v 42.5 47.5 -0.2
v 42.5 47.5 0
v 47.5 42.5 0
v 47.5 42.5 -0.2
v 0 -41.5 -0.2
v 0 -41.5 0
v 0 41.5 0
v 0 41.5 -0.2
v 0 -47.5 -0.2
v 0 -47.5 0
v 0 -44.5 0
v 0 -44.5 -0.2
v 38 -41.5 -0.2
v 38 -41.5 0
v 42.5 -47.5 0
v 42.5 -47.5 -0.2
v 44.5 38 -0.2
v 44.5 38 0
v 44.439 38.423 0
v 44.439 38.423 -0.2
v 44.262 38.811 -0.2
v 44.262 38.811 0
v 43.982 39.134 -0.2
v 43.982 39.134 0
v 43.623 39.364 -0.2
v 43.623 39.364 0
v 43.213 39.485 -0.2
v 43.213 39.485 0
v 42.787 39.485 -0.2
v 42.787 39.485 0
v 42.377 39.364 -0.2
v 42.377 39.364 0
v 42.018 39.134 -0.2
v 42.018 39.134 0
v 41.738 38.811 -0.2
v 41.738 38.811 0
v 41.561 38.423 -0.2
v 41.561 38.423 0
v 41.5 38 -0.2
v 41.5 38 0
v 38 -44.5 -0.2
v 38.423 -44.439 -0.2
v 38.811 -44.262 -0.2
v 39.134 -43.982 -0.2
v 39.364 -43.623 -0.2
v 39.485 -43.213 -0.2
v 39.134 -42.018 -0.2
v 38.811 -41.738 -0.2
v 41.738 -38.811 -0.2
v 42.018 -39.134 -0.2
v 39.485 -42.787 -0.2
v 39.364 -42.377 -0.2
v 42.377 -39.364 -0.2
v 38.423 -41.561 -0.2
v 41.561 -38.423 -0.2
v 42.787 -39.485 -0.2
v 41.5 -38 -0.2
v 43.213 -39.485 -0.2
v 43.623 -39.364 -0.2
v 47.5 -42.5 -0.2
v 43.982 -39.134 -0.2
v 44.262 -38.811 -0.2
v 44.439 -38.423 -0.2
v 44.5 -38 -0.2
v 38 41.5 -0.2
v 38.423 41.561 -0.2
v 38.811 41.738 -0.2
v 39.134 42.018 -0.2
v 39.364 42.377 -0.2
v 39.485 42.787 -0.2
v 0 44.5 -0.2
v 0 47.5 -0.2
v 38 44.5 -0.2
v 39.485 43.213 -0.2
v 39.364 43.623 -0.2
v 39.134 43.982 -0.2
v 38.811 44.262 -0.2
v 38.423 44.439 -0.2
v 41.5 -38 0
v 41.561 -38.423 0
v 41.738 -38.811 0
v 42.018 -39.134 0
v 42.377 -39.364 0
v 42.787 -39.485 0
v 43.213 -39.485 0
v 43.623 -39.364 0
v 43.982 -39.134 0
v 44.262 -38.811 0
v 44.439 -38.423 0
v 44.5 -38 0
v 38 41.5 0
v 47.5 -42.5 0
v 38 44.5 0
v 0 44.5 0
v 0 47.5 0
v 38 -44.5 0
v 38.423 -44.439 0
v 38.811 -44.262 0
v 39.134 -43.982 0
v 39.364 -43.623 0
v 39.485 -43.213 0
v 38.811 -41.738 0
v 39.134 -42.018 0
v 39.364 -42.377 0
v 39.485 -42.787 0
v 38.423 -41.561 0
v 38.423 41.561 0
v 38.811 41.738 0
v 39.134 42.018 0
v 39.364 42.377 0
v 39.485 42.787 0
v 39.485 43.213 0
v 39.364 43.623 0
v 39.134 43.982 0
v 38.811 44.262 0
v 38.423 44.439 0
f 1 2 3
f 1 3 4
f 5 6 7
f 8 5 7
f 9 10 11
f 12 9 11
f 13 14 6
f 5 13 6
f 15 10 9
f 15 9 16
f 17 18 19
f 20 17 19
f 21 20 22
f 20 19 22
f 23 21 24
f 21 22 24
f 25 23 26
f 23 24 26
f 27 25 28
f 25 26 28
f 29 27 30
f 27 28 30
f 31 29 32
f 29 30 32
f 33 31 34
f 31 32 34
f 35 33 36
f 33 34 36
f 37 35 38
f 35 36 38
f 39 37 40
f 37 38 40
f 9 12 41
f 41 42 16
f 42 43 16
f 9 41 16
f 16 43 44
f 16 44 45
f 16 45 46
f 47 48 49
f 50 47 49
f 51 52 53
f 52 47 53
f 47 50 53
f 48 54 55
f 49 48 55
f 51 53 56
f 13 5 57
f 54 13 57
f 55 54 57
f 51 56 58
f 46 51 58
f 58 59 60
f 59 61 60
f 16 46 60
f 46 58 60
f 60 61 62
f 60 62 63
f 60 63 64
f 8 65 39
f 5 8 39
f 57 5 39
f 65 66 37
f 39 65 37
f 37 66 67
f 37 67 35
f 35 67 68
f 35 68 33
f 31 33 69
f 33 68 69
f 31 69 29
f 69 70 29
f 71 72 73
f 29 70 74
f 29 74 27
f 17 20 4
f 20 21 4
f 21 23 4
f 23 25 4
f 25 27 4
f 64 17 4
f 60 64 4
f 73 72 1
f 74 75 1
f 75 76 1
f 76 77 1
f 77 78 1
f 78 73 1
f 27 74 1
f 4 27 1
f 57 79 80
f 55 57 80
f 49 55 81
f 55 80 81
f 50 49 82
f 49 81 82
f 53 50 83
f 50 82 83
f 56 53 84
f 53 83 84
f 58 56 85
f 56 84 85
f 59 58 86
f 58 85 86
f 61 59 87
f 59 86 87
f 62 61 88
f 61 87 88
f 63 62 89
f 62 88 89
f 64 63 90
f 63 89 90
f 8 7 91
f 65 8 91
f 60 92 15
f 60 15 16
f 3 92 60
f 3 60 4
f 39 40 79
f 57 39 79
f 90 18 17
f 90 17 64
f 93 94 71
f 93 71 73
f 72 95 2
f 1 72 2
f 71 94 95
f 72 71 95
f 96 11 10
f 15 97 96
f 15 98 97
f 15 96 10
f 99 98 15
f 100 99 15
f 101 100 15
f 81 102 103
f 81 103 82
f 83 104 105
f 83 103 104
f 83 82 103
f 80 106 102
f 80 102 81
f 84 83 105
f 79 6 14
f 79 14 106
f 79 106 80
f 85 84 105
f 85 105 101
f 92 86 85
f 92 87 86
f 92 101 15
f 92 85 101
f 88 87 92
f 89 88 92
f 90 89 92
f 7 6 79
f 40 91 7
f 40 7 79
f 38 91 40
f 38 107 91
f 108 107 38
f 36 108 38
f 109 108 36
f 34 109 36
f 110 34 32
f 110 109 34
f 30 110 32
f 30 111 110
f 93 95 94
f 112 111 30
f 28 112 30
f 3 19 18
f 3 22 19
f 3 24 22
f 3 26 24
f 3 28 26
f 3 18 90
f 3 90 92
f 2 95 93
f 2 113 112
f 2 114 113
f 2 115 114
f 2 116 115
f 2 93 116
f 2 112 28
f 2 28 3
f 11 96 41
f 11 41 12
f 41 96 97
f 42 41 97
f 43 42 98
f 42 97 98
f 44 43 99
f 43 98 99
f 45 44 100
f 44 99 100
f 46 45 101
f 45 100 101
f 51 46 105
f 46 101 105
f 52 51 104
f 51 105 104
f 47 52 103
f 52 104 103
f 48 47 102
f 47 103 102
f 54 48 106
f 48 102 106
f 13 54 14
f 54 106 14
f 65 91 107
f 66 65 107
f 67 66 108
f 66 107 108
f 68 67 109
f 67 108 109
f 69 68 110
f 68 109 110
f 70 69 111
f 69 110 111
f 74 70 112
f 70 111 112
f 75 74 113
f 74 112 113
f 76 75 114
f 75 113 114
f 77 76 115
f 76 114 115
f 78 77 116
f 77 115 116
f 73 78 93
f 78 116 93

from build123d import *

# Parameters (mm, degrees)
SKETCH001_W        = 95
SKETCH001_H        = 95
PAD001_DEPTH       = 0.2
CHAMFER_SIZE       = 5
POCKET_DEPTH       = 5
POLARPATTERN_COUNT = 4
SKETCH007_W        = 129.60696
SKETCH007_H        = 24.349444
POCKET003_DEPTH    = 47.501


with BuildPart() as part:
    # Sketch001 → Pad001 (new body)
    with BuildSketch(Plane.XY):
        Rectangle(SKETCH001_W, SKETCH001_H)
    extrude(amount=-PAD001_DEPTH)

    # Chamfer
    chamfer_edges = [part.edges().sort_by_distance(p)[0] for p in [
        (-47.5, 47.5, -0.1),
        (47.5, 47.5, -0.1),
        (-47.5, -47.5, -0.1),
        (47.5, -47.5, -0.1),
    ]]
    chamfer(chamfer_edges, length=CHAMFER_SIZE)

    # Sketch003 (on Face2 of Chamfer) → Pocket (cut)
    with BuildSketch(Plane.XY):
        with BuildLine():
            ThreePointArc((-38, 44.5), (-39.5, 43), (-38, 41.5))
            Line((-38, 41.5), (38, 41.5))
            ThreePointArc((38, 41.5), (39.5, 43), (38, 44.5))
            Line((-38, 44.5), (38, 44.5))
        make_face()
    pocket = extrude(amount=-POCKET_DEPTH, mode=Mode.SUBTRACT)

    # PolarPattern: Pocket ×4 about axis
    polarpattern_axis = Axis((0, 0, 0), (0, 0, 1))
    for i in range(1, POLARPATTERN_COUNT):
        add(pocket.rotate(polarpattern_axis, i * 360 / POLARPATTERN_COUNT), mode=Mode.SUBTRACT)

    # Sketch007 → Pocket003 (cut, through all)
    with BuildSketch(Plane.YZ):
        with Locations((-2.349726, 5.652762)):
            Rectangle(SKETCH007_W, SKETCH007_H)
    extrude(amount=-POCKET003_DEPTH, mode=Mode.SUBTRACT)


solid = part.part
